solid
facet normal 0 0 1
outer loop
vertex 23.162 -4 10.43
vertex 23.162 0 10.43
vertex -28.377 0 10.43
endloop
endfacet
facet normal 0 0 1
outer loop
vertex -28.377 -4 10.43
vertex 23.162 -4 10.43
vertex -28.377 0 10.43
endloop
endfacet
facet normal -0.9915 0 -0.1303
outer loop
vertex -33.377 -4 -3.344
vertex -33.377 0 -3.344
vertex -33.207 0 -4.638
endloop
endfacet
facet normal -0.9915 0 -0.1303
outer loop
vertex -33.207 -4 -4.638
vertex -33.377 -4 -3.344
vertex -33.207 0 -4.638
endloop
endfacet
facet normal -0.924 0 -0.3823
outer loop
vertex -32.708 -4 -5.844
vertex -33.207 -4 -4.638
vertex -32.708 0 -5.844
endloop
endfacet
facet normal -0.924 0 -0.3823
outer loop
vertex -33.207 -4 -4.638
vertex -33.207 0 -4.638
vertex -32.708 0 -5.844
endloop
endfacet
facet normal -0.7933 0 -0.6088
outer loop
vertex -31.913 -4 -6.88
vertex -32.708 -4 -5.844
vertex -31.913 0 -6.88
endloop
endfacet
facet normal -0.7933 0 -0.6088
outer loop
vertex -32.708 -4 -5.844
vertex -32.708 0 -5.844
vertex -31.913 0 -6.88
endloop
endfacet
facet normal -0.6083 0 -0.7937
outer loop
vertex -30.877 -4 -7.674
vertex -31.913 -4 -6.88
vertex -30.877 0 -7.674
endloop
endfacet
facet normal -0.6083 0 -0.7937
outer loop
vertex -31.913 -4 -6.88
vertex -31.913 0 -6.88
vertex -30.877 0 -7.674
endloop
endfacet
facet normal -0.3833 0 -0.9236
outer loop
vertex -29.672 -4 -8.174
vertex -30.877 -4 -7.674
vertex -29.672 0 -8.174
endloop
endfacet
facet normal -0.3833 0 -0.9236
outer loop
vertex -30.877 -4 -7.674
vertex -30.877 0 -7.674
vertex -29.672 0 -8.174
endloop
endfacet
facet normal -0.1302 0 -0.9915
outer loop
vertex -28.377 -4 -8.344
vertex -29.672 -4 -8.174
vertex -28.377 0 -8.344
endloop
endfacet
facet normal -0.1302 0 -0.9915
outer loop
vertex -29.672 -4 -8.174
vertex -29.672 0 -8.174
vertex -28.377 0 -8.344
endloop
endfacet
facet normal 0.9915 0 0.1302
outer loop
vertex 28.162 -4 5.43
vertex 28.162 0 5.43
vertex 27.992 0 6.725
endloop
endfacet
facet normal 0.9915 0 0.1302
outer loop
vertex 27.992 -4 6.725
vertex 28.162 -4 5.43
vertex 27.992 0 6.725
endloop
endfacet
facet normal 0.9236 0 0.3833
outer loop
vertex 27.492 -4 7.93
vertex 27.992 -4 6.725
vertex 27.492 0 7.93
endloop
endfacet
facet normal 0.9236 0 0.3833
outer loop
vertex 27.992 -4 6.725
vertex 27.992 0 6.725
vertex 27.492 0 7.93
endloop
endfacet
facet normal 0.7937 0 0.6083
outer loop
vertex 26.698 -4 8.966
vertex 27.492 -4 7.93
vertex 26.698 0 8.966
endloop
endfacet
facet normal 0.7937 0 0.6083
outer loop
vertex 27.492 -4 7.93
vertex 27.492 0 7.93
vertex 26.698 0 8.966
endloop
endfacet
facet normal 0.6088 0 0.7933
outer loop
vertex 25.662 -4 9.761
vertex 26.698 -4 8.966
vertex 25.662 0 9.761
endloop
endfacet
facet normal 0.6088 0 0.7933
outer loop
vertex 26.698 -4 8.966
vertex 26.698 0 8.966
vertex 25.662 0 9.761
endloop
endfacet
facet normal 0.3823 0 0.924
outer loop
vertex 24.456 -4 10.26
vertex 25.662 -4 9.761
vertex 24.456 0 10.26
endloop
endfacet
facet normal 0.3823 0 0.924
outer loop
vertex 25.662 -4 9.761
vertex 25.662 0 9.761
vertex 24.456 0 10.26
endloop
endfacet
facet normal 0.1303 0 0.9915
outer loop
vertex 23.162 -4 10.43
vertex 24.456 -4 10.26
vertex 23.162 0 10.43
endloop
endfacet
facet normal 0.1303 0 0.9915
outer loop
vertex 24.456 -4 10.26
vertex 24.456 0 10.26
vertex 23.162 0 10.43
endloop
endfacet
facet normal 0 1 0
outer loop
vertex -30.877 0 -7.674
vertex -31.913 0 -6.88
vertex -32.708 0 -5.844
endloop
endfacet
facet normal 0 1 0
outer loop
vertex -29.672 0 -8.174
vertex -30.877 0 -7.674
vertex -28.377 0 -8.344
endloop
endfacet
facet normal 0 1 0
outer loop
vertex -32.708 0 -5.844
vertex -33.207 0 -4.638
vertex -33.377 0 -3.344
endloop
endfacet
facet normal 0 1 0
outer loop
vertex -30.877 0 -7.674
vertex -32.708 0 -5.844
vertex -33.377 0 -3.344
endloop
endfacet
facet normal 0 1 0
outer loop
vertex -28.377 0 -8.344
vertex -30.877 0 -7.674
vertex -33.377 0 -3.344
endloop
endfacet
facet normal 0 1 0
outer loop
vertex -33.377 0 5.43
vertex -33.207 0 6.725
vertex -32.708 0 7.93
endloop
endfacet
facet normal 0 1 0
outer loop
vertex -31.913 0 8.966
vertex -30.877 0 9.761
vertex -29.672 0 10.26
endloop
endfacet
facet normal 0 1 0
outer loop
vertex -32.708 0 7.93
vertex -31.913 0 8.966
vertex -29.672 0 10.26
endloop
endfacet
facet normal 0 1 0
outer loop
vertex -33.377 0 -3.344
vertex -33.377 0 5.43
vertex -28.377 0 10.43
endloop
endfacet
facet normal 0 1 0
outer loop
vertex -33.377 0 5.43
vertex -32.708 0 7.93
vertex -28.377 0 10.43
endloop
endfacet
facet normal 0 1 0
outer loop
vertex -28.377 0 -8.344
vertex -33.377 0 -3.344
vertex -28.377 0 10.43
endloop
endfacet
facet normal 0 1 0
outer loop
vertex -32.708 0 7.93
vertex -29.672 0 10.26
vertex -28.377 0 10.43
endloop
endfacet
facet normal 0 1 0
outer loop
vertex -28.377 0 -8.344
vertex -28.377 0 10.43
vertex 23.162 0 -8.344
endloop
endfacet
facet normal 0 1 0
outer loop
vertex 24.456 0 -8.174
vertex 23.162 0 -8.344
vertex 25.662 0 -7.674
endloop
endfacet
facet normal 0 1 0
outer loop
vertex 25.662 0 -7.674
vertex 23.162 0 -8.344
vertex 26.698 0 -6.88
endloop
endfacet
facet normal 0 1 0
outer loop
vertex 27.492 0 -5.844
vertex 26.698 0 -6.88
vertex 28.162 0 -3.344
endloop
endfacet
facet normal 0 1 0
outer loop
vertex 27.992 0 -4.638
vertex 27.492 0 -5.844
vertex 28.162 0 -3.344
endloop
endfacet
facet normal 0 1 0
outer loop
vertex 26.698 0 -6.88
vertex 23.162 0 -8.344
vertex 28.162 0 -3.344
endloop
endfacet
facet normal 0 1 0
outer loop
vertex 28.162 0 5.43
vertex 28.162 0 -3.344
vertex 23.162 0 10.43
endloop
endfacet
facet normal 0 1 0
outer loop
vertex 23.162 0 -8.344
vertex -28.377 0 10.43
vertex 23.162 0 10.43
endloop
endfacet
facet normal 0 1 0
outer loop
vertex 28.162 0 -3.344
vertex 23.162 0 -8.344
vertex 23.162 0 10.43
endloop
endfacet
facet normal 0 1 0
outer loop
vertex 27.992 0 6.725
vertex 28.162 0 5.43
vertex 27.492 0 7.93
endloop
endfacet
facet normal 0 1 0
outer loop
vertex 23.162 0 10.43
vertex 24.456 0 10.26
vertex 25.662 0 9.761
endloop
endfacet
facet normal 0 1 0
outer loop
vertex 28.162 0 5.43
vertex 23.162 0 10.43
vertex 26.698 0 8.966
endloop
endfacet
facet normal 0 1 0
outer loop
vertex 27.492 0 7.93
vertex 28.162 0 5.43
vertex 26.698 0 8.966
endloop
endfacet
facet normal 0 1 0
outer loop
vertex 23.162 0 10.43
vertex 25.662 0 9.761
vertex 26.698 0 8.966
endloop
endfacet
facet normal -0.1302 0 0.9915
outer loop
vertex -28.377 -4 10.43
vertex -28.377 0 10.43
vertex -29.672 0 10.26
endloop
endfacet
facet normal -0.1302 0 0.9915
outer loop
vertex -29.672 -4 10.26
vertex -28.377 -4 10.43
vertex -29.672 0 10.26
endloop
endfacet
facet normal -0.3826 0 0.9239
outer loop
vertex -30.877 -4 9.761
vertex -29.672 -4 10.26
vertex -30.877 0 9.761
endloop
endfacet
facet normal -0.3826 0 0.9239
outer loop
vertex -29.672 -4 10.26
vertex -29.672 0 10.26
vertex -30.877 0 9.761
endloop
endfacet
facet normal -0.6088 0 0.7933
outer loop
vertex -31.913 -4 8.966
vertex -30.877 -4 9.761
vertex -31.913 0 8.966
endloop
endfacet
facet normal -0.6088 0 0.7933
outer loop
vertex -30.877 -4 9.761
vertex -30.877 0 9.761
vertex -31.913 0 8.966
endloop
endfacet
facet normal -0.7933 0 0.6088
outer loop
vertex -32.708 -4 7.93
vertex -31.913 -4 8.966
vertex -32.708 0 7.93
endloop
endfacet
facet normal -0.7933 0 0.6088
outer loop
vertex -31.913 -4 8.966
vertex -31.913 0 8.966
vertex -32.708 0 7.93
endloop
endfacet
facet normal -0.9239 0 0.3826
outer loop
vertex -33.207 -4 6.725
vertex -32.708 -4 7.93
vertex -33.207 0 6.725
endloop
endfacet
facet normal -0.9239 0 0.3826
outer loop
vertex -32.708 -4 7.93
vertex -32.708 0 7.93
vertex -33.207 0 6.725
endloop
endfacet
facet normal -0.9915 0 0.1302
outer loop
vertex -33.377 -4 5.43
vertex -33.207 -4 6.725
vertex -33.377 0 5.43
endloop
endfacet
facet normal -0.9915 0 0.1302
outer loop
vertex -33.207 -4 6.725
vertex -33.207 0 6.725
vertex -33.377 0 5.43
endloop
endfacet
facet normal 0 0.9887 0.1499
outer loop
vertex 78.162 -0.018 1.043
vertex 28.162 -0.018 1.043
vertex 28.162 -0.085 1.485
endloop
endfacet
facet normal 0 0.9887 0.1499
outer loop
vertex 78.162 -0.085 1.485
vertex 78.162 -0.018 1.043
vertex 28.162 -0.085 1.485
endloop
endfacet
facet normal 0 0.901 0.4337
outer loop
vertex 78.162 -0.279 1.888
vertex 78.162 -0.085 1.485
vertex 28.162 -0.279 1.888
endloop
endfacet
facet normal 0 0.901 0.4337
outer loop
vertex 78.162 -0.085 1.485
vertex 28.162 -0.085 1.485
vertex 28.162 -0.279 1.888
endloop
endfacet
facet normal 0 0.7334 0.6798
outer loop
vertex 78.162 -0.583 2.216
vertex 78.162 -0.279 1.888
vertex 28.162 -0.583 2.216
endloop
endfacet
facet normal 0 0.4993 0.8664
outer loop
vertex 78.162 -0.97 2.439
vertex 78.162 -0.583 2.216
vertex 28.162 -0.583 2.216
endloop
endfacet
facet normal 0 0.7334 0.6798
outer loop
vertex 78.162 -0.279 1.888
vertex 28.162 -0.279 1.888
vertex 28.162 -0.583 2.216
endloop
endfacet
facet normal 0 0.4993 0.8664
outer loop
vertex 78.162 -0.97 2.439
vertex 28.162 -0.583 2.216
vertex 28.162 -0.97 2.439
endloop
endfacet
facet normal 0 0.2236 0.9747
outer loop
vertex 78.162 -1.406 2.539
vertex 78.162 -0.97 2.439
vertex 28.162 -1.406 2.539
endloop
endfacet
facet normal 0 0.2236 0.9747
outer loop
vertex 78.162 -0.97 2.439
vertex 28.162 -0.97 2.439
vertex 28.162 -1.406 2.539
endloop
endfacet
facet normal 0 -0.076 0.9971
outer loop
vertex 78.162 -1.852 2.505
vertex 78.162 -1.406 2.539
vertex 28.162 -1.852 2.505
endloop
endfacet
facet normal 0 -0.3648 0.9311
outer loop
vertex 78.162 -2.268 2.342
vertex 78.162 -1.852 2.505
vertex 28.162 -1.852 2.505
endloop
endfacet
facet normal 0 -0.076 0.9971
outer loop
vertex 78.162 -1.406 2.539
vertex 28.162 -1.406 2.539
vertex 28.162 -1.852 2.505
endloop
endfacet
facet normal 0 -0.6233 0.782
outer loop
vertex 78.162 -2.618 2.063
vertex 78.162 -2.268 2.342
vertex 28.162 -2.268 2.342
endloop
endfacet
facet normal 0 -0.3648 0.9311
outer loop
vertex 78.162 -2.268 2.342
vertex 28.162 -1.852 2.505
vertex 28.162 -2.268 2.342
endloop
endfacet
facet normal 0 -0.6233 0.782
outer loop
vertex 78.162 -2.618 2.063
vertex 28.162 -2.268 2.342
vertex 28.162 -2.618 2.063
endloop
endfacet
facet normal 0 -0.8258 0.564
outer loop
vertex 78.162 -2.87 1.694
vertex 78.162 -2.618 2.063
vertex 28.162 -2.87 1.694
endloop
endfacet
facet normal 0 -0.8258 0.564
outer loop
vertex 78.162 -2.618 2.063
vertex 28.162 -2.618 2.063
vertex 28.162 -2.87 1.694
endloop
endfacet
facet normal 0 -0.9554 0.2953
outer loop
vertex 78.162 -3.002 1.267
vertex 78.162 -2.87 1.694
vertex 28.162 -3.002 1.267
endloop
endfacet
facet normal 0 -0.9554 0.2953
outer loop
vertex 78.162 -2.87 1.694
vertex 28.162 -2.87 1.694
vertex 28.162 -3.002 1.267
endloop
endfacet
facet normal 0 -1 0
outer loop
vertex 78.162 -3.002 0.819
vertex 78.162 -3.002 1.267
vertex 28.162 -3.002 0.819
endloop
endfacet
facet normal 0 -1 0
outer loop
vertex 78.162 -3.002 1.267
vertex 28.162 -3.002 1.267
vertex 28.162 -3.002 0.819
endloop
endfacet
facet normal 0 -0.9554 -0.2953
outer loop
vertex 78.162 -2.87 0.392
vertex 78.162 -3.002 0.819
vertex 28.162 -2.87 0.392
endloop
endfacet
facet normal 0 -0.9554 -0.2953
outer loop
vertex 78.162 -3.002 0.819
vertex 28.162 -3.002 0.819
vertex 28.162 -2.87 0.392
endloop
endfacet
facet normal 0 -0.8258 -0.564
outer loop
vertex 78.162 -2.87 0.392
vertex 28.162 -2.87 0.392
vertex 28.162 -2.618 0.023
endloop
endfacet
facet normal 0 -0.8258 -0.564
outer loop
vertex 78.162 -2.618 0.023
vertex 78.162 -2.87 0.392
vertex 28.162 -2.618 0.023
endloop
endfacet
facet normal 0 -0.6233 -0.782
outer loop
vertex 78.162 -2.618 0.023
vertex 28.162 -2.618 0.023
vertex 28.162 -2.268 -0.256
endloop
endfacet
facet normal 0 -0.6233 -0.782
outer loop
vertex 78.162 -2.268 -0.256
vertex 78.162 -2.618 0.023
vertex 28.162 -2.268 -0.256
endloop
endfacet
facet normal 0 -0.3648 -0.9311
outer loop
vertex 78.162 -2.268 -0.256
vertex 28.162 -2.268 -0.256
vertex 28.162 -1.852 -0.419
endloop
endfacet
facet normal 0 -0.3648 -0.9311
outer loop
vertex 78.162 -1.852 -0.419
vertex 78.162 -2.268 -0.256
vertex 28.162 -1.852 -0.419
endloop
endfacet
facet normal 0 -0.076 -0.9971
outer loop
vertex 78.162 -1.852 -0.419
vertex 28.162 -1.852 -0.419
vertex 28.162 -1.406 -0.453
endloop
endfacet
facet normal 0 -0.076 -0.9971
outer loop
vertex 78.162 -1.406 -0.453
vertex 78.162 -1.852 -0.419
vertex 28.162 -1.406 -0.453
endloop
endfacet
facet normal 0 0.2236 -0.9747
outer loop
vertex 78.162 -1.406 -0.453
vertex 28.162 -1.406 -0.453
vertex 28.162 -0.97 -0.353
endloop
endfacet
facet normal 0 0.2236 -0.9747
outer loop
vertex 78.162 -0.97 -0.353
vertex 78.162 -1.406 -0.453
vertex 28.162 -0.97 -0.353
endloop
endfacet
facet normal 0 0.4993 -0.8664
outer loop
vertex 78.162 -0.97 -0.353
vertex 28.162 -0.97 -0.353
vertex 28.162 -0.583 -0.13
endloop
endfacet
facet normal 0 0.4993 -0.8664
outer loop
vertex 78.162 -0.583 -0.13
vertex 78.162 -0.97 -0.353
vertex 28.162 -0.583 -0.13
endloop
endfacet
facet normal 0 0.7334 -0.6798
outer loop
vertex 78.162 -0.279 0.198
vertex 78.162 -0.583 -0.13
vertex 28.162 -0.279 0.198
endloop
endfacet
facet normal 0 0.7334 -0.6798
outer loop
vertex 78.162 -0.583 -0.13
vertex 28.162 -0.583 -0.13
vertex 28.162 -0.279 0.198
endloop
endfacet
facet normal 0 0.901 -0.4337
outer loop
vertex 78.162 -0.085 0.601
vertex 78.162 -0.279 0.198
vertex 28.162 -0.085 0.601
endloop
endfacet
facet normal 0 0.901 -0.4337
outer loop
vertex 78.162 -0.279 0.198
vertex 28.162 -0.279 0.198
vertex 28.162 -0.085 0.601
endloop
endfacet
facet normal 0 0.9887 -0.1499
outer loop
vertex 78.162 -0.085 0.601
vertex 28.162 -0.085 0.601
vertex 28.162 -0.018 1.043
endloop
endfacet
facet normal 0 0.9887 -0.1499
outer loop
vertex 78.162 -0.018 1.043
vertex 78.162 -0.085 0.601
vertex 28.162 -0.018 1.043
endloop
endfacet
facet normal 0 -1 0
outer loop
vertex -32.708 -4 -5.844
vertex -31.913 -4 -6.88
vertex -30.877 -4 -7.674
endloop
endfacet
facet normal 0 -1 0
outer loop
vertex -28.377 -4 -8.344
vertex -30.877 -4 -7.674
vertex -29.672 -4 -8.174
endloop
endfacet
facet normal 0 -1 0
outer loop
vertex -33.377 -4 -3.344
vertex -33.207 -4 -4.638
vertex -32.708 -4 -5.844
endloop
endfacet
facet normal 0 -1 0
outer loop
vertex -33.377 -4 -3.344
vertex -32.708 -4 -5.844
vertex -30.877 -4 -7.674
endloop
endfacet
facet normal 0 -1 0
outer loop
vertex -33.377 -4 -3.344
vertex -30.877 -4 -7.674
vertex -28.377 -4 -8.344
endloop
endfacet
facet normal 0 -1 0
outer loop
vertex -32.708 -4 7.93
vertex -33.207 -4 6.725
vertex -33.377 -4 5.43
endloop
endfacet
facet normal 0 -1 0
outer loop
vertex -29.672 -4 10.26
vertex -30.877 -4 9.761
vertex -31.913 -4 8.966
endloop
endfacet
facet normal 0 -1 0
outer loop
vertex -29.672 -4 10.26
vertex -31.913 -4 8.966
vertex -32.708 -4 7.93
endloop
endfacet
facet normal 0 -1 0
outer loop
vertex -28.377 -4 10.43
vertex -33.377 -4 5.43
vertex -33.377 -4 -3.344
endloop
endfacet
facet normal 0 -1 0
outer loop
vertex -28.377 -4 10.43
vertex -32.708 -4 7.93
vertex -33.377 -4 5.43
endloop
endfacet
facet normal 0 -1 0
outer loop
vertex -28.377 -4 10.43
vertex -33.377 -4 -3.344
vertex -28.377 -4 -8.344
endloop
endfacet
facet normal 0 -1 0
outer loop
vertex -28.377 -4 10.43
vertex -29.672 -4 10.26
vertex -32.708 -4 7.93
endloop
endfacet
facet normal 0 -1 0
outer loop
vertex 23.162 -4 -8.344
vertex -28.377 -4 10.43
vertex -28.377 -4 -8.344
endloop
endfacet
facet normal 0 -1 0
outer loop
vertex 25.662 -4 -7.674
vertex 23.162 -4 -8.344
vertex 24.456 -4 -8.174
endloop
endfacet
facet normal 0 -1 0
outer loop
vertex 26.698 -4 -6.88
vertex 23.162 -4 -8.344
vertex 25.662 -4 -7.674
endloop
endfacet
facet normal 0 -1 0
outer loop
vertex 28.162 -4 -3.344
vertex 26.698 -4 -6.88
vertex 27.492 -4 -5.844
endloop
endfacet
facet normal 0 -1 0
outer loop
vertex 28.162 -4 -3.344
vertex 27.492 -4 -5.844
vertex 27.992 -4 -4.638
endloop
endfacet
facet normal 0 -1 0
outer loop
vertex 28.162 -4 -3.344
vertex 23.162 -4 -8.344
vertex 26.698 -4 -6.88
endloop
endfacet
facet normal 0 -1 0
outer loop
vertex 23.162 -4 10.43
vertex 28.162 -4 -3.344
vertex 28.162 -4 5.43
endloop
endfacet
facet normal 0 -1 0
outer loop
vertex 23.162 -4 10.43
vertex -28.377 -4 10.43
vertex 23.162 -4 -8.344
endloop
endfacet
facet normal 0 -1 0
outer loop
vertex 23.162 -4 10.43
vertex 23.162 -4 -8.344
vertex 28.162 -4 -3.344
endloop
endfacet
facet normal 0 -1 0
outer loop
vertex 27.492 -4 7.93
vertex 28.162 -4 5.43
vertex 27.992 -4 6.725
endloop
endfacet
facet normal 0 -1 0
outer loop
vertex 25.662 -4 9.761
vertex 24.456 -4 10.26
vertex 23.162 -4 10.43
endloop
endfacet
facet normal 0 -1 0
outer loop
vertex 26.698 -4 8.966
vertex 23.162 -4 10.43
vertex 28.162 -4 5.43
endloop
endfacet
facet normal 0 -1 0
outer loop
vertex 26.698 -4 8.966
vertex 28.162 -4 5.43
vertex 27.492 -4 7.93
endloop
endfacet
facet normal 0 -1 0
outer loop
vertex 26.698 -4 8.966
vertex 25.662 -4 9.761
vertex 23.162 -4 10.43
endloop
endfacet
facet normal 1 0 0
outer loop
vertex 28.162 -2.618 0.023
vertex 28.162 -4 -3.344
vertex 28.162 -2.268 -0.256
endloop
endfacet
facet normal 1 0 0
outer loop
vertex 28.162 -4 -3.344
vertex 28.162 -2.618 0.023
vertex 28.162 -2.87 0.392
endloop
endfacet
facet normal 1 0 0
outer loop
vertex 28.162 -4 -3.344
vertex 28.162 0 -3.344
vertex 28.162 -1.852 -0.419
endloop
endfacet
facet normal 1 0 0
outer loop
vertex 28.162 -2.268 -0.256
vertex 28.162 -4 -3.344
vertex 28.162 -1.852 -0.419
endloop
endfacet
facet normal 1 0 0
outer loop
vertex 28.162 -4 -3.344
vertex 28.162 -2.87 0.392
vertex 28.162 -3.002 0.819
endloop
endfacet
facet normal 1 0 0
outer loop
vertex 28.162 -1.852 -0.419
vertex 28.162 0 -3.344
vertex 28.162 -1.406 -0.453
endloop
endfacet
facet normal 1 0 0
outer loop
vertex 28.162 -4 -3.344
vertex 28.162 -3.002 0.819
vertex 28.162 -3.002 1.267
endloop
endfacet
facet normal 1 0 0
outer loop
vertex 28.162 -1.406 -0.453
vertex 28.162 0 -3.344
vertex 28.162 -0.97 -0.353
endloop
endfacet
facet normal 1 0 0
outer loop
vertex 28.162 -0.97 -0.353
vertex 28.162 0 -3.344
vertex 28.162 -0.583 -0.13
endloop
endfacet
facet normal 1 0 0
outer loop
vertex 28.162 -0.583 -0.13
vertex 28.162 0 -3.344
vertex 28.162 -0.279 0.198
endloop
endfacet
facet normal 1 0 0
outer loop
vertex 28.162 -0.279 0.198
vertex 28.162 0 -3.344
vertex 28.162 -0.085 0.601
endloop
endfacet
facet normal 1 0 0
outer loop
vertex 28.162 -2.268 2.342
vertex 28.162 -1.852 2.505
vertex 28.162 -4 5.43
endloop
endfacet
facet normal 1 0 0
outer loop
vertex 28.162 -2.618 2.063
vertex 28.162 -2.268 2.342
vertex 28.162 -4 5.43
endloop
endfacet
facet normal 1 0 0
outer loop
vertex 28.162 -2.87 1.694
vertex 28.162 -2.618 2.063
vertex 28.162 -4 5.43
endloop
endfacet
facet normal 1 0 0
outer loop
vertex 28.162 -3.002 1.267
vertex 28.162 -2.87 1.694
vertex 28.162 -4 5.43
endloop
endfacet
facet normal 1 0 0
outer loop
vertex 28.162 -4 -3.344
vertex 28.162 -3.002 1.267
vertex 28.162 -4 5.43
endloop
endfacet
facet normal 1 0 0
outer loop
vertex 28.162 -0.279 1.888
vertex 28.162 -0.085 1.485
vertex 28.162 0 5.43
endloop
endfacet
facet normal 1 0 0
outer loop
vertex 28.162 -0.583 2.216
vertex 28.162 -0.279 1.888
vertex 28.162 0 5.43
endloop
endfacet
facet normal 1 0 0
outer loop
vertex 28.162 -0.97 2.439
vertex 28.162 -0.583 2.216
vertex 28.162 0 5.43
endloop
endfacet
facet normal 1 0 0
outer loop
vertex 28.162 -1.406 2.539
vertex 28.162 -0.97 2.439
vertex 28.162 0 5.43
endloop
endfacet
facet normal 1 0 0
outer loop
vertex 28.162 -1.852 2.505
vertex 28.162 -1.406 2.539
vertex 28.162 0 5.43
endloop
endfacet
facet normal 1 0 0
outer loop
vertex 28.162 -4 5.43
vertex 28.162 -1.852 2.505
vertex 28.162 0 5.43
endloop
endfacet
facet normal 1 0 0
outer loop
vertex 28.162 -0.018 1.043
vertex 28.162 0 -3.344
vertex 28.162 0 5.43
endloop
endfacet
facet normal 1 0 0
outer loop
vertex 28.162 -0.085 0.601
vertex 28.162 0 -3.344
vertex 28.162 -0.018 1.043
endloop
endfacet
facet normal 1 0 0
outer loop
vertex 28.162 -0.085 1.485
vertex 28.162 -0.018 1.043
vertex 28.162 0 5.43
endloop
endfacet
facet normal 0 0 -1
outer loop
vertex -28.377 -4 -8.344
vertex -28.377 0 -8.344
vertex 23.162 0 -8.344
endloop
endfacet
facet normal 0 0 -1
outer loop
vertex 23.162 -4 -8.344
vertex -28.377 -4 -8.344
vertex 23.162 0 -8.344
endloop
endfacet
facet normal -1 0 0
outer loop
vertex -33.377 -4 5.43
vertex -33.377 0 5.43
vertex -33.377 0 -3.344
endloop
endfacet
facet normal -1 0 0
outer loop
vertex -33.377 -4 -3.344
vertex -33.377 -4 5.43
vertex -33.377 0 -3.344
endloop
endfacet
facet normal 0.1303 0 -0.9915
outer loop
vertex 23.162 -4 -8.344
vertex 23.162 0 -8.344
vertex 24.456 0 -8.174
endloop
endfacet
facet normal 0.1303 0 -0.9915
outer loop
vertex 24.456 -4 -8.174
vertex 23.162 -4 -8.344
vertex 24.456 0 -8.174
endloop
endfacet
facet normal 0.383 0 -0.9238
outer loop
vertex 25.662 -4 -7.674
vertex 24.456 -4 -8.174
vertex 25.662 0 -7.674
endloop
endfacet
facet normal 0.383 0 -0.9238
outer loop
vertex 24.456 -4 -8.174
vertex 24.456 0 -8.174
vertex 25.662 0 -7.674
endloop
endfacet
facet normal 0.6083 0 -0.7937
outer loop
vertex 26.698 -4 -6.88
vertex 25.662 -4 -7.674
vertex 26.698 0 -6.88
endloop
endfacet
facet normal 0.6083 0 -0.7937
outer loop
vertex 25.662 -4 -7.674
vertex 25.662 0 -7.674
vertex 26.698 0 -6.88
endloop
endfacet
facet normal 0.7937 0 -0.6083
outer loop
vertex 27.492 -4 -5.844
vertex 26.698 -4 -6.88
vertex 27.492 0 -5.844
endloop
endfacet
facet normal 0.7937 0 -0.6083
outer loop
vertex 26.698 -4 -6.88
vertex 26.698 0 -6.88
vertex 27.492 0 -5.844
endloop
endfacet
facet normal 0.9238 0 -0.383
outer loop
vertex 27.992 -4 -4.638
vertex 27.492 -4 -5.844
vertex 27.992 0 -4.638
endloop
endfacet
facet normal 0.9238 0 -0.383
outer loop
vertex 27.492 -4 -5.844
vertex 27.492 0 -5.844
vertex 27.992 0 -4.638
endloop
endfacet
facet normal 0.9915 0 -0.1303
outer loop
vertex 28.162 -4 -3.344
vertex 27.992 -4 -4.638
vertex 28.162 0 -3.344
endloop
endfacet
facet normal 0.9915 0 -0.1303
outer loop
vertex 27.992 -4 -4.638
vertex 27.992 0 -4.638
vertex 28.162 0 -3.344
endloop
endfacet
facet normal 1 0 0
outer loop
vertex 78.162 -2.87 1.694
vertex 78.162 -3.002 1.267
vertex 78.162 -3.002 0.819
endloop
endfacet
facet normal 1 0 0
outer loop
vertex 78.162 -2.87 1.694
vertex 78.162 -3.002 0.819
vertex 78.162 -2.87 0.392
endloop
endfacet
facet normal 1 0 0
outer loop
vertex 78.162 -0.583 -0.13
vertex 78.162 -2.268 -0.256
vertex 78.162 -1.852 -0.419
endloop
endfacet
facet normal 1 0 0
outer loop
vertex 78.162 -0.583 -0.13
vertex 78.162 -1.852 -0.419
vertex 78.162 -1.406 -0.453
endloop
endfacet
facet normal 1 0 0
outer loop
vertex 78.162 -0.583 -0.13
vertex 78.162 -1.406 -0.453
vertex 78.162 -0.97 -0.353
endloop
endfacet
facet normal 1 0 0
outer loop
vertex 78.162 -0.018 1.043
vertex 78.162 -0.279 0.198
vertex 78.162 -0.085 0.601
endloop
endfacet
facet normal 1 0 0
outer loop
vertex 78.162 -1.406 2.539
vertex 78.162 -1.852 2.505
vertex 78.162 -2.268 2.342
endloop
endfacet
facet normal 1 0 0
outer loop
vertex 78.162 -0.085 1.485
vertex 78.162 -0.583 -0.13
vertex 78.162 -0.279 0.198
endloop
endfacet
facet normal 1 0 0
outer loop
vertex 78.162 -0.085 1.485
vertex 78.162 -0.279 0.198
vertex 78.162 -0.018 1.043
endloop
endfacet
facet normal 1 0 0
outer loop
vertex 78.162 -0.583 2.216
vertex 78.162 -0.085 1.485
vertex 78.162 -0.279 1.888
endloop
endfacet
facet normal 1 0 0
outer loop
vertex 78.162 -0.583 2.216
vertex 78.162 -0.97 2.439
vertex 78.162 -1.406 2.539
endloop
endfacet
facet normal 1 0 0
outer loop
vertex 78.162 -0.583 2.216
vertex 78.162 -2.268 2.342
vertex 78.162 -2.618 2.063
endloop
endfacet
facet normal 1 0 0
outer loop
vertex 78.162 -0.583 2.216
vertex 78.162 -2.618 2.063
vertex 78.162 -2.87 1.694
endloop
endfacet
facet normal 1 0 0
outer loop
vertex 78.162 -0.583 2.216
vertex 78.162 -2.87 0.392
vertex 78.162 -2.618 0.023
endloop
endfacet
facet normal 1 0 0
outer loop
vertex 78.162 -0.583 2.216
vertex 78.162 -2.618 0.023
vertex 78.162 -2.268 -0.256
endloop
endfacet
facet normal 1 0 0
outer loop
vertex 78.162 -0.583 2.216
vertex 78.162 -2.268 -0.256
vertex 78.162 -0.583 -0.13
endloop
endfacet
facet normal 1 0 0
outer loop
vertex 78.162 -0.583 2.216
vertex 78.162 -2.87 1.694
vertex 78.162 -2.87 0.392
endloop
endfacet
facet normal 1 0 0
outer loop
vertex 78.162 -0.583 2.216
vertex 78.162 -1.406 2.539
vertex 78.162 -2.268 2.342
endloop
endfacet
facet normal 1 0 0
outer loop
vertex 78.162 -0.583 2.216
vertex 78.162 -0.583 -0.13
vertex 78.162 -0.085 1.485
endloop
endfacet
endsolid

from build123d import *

# Parameters (mm, degrees)
F1_DEPTH = 4
F2_R     = 1.5
F3_DEPTH = 50


with BuildPart() as f1:
    # F0 (on Front) → F1 (new body)
    with BuildSketch(Plane.XZ):
        with BuildLine():
            Line((23.162254, 10.430464), (-28.377483, 10.430464))
            ThreePointArc((-28.377483, 10.430464), (-31.913017, 8.965997), (-33.377483, 5.430464))
            Line((-33.377483, 5.430464), (-33.377483, -3.344371))
            ThreePointArc((-33.377483, -3.344371), (-31.913017, -6.879905), (-28.377483, -8.344371))
            Line((-28.377483, -8.344371), (23.162254, -8.344371))
            ThreePointArc((23.162254, -8.344371), (26.697788, -6.879905), (28.162254, -3.344371))
            Line((28.162254, -3.344371), (28.162254, 5.430464))
            ThreePointArc((28.162254, 5.430464), (26.697788, 8.965997), (23.162254, 10.430464))
        make_face()
    extrude(amount=F1_DEPTH)

    # F2 (on face) → F3 (join)
    with BuildSketch(Plane.YZ.offset(28.162254)):
        with Locations((-1.518368, 1.043046)):
            Circle(F2_R)
    extrude(amount=F3_DEPTH)


solid = f1.part
